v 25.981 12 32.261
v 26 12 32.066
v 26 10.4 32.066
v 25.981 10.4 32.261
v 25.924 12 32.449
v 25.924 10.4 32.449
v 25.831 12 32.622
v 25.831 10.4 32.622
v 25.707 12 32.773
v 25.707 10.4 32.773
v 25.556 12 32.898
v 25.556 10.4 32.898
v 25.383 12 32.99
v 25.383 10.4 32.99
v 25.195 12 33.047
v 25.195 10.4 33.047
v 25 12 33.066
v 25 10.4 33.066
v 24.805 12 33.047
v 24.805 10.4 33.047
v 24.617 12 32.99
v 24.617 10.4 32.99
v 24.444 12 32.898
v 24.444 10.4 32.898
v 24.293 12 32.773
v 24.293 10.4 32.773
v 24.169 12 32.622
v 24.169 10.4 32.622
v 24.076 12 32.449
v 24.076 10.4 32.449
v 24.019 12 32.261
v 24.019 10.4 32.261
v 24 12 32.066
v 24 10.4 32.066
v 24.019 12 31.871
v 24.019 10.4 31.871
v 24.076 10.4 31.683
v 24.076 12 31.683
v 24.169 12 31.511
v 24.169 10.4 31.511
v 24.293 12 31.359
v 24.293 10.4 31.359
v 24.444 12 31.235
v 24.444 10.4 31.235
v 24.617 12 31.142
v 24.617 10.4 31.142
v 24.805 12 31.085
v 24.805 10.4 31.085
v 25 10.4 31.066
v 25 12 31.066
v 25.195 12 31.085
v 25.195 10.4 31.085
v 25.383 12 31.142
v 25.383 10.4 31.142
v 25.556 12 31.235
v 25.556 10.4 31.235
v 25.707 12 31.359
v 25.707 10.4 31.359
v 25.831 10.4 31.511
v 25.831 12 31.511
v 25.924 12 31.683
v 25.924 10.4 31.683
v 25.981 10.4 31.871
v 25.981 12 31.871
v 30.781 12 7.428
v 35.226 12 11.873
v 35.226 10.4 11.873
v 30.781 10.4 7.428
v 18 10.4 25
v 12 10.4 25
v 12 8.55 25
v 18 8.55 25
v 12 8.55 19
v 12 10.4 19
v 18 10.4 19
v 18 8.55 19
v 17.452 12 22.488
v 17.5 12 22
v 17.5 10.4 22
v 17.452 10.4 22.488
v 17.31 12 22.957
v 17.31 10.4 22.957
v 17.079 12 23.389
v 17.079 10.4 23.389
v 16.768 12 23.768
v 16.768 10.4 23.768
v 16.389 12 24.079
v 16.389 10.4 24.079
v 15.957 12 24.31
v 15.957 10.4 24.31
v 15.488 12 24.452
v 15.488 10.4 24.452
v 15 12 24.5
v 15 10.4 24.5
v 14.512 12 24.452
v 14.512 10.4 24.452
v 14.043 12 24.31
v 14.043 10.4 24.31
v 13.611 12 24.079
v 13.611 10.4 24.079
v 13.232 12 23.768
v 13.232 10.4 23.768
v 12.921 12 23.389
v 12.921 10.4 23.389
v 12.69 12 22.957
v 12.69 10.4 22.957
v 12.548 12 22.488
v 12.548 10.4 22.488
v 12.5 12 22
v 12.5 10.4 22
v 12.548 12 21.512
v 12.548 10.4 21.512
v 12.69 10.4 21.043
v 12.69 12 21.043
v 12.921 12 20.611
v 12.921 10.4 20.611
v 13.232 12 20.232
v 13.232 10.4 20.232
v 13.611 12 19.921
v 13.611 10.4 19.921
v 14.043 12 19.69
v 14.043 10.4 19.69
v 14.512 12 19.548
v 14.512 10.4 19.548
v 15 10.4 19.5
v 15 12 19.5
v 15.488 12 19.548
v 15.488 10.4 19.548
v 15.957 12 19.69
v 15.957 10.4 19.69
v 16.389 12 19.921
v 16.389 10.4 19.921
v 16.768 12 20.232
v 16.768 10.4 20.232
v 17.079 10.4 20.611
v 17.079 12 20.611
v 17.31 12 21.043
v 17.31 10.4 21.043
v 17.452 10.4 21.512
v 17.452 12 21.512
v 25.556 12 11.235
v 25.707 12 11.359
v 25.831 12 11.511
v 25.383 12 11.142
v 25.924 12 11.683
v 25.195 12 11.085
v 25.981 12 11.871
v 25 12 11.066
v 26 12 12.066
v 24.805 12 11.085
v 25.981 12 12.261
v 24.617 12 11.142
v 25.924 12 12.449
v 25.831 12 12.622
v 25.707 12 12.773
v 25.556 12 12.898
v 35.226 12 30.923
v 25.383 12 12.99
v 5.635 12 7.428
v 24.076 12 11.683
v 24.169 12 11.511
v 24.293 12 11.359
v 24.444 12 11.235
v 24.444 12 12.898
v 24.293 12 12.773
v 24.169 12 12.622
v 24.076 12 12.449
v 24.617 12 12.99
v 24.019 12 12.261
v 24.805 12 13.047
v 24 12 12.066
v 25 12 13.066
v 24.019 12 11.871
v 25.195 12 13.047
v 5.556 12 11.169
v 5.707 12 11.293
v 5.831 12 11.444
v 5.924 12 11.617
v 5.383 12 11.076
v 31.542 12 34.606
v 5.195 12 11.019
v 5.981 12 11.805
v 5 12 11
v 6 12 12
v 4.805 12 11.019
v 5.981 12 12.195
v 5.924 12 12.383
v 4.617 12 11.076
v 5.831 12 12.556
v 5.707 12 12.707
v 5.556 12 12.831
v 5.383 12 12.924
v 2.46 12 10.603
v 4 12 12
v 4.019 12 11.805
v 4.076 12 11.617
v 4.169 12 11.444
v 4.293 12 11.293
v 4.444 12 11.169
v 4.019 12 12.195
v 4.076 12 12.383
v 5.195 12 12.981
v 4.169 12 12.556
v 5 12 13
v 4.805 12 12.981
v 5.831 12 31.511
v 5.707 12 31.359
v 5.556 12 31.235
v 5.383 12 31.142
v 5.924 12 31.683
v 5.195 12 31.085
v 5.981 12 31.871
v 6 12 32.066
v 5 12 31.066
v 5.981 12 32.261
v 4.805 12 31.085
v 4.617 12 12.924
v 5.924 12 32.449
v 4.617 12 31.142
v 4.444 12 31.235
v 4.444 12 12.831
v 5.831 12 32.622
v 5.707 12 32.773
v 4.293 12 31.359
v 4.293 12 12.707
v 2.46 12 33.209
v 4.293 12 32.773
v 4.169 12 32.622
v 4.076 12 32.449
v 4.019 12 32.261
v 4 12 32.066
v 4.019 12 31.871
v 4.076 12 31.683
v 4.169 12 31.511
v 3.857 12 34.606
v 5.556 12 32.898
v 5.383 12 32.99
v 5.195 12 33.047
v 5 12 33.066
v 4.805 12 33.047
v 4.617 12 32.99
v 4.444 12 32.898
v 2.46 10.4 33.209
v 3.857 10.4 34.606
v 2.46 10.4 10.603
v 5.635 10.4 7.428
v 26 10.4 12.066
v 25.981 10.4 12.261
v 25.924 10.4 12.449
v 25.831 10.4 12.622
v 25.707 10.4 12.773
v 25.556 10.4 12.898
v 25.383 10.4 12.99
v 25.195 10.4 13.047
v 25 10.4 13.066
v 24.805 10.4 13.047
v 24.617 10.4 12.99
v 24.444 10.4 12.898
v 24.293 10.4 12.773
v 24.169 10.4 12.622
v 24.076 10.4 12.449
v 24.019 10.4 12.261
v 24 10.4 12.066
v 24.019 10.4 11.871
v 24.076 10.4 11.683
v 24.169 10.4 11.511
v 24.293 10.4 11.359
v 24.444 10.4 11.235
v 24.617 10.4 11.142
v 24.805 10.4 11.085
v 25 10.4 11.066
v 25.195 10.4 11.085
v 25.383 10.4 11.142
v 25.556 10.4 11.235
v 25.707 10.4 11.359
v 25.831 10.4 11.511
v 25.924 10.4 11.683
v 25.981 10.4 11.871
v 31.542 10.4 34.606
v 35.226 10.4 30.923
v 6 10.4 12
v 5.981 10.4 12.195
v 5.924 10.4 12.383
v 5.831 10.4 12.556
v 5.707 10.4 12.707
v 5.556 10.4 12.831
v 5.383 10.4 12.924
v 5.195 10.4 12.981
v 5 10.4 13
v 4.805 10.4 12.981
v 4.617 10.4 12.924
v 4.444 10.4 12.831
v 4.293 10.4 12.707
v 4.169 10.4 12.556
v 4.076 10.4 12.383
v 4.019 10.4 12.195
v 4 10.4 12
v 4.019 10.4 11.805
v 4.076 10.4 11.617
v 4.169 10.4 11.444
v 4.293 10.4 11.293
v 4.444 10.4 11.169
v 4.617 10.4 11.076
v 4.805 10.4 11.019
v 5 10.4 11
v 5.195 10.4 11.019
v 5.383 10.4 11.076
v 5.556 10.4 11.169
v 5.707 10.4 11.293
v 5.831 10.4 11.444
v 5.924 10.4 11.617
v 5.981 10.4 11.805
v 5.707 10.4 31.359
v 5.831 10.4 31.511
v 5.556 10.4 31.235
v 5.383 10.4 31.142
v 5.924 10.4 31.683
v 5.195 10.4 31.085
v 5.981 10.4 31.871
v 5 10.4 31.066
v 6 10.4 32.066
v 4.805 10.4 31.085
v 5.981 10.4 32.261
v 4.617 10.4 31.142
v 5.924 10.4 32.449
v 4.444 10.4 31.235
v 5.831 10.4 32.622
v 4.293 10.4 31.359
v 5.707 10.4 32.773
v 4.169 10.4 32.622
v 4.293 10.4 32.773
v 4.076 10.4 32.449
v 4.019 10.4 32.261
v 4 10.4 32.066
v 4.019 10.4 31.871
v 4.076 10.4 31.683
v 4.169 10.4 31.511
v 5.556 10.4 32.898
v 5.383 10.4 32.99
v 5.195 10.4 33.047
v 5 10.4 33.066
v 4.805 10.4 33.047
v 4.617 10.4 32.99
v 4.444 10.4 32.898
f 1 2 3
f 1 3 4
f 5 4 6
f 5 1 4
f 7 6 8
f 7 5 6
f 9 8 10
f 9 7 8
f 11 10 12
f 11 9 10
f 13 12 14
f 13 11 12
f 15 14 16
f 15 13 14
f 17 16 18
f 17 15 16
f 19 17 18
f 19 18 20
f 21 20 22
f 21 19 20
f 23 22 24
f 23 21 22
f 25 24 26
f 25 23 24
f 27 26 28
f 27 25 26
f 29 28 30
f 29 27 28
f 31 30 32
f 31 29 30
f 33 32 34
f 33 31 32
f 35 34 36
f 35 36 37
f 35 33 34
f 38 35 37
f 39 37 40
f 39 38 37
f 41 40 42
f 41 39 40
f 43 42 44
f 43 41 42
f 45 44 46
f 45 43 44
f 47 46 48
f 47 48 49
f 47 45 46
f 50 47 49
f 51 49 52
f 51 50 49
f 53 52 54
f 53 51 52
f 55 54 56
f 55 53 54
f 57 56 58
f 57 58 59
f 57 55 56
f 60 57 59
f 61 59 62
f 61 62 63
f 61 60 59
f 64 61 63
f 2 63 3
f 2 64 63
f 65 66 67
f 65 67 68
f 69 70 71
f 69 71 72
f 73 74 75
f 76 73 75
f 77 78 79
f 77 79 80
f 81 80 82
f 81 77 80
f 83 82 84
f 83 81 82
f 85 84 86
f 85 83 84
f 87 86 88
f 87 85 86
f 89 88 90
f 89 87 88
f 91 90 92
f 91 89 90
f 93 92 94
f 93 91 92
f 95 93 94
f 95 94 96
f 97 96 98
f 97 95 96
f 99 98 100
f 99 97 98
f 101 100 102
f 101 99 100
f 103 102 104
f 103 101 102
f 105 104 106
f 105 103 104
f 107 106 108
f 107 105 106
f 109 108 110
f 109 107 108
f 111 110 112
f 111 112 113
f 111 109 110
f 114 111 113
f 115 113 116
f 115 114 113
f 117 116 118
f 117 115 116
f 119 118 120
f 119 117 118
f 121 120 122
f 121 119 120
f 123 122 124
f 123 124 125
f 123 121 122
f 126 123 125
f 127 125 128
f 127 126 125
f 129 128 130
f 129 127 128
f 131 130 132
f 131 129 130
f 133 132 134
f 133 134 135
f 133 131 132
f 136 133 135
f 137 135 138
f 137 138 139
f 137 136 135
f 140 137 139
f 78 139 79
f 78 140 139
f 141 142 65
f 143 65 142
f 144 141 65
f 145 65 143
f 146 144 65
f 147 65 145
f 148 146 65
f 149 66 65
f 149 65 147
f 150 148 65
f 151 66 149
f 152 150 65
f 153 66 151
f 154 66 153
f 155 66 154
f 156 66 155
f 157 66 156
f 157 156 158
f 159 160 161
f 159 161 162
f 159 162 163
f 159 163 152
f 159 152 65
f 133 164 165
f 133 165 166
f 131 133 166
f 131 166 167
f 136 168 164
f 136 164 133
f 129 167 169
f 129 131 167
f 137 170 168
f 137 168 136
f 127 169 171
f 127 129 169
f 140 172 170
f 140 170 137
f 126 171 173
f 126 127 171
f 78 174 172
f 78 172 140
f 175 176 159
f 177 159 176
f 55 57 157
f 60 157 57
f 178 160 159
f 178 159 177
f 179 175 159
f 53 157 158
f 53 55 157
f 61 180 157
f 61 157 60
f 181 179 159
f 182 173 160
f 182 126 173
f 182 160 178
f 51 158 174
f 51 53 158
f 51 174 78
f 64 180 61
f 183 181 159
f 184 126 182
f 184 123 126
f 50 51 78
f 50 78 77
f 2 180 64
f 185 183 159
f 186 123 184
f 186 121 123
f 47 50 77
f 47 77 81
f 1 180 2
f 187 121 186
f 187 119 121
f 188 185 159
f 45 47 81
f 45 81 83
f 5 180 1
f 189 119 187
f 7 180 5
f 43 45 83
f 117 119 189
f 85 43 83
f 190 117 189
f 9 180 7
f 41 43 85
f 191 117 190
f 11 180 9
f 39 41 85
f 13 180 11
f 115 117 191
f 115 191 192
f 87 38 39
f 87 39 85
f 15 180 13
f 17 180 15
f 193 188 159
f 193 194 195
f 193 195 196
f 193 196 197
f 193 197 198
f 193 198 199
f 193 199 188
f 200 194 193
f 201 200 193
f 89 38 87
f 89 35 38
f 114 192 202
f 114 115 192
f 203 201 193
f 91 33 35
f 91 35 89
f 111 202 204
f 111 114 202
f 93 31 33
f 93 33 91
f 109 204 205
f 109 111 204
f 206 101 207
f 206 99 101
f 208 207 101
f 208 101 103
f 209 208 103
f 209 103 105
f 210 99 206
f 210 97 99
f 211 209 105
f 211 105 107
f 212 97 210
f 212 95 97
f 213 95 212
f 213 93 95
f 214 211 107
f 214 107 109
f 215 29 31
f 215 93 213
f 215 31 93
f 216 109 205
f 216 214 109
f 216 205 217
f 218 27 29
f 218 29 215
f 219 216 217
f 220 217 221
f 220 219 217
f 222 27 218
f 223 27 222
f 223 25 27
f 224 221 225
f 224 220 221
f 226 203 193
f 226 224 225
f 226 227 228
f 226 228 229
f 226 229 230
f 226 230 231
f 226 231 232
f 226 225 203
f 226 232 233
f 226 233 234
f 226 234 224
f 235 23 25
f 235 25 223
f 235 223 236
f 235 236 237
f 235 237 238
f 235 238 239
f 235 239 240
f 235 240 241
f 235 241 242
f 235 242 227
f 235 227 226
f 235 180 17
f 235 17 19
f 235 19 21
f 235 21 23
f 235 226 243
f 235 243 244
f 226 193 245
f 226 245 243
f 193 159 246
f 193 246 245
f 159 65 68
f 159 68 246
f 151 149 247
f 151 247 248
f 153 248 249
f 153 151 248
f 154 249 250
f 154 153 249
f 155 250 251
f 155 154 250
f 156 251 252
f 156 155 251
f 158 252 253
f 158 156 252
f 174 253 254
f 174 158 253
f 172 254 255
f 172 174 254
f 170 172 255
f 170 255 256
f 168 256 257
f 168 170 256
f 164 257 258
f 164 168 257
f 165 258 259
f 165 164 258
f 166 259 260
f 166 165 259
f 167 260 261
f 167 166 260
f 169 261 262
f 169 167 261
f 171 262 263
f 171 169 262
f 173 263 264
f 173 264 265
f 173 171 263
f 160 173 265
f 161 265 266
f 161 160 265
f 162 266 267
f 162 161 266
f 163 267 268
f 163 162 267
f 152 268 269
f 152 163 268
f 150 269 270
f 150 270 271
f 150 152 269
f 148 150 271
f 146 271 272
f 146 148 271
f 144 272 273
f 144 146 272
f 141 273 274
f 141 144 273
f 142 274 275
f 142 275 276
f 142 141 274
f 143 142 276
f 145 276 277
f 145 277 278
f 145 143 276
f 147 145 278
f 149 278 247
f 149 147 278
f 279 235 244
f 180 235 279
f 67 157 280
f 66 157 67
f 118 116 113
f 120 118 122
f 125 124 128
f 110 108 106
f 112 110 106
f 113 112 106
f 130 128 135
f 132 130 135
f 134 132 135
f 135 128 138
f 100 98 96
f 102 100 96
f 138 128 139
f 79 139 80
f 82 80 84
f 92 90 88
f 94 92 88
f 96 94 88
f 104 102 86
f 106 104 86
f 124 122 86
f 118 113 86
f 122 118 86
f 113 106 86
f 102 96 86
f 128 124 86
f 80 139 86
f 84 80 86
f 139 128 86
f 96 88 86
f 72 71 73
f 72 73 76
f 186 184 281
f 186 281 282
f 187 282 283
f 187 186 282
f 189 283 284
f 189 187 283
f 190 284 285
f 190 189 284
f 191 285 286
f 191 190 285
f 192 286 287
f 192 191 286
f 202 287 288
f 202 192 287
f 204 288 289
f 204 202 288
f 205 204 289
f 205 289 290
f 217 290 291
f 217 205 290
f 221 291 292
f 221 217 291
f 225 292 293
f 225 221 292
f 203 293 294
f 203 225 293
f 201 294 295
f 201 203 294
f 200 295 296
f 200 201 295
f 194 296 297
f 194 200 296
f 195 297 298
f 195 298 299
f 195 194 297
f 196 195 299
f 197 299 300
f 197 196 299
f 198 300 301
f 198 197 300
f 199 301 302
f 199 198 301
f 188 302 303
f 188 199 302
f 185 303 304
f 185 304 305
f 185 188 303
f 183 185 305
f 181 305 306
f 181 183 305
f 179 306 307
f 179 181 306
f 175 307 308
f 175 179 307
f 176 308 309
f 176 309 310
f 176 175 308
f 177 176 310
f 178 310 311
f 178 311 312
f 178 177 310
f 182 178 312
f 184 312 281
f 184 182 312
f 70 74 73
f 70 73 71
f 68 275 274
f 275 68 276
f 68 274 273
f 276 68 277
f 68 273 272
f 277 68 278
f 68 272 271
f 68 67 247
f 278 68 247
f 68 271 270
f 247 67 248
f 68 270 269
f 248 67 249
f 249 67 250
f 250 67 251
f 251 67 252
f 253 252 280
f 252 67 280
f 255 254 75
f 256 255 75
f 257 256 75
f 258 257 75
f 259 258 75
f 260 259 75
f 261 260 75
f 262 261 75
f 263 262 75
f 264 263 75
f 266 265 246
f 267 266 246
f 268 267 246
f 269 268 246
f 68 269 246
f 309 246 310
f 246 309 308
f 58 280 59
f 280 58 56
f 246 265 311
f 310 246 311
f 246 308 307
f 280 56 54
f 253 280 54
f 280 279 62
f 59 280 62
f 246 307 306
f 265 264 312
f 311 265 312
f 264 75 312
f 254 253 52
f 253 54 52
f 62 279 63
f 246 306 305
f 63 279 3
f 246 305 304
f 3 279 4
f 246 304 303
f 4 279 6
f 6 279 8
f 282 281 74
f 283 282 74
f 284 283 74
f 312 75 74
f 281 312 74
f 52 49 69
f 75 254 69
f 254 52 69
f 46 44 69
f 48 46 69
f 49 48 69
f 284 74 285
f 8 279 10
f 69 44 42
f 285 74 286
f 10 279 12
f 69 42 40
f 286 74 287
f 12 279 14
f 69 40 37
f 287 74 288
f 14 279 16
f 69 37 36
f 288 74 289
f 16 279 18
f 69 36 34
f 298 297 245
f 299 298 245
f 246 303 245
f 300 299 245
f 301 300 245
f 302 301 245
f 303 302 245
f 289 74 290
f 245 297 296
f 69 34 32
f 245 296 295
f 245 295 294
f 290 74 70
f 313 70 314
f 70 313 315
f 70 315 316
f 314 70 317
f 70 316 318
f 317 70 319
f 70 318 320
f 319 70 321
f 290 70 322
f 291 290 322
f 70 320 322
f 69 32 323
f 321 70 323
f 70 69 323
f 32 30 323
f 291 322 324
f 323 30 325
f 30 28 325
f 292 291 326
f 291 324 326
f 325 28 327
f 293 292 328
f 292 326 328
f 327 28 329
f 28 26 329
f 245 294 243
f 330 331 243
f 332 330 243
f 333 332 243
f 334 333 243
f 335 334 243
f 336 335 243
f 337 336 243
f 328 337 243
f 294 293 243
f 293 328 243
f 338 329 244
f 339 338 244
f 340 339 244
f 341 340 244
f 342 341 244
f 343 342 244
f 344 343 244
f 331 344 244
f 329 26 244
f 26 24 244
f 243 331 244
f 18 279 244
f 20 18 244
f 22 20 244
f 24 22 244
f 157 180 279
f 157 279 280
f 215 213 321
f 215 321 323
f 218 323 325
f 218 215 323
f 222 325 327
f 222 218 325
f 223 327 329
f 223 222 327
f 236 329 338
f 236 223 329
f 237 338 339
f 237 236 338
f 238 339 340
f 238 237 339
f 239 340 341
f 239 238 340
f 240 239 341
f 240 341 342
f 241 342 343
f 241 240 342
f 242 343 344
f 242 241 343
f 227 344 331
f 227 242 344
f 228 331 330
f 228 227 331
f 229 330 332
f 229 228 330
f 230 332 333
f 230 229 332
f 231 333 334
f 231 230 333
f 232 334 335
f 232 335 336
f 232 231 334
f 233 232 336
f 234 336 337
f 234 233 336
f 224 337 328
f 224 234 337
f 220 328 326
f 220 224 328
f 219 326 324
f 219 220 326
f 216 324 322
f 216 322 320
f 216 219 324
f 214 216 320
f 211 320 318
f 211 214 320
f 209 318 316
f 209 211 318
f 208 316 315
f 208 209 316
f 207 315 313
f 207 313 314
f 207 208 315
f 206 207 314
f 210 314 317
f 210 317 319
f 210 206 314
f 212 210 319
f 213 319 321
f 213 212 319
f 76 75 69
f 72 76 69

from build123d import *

# Parameters (mm, degrees)
SKETCH154_R   = 1
SKETCH154_R_2 = 2.5
PAD078_DEPTH  = 1.6
SKETCH157_W   = 6
SKETCH157_H   = 6
PAD080_DEPTH  = 1.85


with BuildPart() as part:
    # Sketch154 → Pad078 (new body)
    with BuildSketch(Plane.XZ):
        Polygon((0.634909, -4.572), (-2.54, -1.397091), (-2.54, 21.208909), (-1.142757, 22.606152), (26.542463, 22.606152), (30.225783, 18.922833), (30.225783, -0.127127), (25.780909, -4.572), align=None)
        with Locations((0, 20.066152)):
            Circle(SKETCH154_R, mode=Mode.SUBTRACT)
        Circle(SKETCH154_R, mode=Mode.SUBTRACT)
        with Locations((20, 20.066152)):
            Circle(SKETCH154_R, mode=Mode.SUBTRACT)
        with Locations((20, 0.066152)):
            Circle(SKETCH154_R, mode=Mode.SUBTRACT)
        with Locations((10, 10)):
            Circle(SKETCH154_R_2, mode=Mode.SUBTRACT)
    extrude(amount=PAD078_DEPTH)

    # Sketch157 (on Face15 of Pad078) → Pad080 (join)
    with BuildSketch(Plane.XZ.offset(1.6)):
        with Locations((10, 10)):
            Rectangle(SKETCH157_W, SKETCH157_H)
    extrude(amount=PAD080_DEPTH)


with BuildPart() as part_1:
    # Body062 placement: moved
    add(part.part.moved(Location((5, 12, 12))))


solid = part_1.part
